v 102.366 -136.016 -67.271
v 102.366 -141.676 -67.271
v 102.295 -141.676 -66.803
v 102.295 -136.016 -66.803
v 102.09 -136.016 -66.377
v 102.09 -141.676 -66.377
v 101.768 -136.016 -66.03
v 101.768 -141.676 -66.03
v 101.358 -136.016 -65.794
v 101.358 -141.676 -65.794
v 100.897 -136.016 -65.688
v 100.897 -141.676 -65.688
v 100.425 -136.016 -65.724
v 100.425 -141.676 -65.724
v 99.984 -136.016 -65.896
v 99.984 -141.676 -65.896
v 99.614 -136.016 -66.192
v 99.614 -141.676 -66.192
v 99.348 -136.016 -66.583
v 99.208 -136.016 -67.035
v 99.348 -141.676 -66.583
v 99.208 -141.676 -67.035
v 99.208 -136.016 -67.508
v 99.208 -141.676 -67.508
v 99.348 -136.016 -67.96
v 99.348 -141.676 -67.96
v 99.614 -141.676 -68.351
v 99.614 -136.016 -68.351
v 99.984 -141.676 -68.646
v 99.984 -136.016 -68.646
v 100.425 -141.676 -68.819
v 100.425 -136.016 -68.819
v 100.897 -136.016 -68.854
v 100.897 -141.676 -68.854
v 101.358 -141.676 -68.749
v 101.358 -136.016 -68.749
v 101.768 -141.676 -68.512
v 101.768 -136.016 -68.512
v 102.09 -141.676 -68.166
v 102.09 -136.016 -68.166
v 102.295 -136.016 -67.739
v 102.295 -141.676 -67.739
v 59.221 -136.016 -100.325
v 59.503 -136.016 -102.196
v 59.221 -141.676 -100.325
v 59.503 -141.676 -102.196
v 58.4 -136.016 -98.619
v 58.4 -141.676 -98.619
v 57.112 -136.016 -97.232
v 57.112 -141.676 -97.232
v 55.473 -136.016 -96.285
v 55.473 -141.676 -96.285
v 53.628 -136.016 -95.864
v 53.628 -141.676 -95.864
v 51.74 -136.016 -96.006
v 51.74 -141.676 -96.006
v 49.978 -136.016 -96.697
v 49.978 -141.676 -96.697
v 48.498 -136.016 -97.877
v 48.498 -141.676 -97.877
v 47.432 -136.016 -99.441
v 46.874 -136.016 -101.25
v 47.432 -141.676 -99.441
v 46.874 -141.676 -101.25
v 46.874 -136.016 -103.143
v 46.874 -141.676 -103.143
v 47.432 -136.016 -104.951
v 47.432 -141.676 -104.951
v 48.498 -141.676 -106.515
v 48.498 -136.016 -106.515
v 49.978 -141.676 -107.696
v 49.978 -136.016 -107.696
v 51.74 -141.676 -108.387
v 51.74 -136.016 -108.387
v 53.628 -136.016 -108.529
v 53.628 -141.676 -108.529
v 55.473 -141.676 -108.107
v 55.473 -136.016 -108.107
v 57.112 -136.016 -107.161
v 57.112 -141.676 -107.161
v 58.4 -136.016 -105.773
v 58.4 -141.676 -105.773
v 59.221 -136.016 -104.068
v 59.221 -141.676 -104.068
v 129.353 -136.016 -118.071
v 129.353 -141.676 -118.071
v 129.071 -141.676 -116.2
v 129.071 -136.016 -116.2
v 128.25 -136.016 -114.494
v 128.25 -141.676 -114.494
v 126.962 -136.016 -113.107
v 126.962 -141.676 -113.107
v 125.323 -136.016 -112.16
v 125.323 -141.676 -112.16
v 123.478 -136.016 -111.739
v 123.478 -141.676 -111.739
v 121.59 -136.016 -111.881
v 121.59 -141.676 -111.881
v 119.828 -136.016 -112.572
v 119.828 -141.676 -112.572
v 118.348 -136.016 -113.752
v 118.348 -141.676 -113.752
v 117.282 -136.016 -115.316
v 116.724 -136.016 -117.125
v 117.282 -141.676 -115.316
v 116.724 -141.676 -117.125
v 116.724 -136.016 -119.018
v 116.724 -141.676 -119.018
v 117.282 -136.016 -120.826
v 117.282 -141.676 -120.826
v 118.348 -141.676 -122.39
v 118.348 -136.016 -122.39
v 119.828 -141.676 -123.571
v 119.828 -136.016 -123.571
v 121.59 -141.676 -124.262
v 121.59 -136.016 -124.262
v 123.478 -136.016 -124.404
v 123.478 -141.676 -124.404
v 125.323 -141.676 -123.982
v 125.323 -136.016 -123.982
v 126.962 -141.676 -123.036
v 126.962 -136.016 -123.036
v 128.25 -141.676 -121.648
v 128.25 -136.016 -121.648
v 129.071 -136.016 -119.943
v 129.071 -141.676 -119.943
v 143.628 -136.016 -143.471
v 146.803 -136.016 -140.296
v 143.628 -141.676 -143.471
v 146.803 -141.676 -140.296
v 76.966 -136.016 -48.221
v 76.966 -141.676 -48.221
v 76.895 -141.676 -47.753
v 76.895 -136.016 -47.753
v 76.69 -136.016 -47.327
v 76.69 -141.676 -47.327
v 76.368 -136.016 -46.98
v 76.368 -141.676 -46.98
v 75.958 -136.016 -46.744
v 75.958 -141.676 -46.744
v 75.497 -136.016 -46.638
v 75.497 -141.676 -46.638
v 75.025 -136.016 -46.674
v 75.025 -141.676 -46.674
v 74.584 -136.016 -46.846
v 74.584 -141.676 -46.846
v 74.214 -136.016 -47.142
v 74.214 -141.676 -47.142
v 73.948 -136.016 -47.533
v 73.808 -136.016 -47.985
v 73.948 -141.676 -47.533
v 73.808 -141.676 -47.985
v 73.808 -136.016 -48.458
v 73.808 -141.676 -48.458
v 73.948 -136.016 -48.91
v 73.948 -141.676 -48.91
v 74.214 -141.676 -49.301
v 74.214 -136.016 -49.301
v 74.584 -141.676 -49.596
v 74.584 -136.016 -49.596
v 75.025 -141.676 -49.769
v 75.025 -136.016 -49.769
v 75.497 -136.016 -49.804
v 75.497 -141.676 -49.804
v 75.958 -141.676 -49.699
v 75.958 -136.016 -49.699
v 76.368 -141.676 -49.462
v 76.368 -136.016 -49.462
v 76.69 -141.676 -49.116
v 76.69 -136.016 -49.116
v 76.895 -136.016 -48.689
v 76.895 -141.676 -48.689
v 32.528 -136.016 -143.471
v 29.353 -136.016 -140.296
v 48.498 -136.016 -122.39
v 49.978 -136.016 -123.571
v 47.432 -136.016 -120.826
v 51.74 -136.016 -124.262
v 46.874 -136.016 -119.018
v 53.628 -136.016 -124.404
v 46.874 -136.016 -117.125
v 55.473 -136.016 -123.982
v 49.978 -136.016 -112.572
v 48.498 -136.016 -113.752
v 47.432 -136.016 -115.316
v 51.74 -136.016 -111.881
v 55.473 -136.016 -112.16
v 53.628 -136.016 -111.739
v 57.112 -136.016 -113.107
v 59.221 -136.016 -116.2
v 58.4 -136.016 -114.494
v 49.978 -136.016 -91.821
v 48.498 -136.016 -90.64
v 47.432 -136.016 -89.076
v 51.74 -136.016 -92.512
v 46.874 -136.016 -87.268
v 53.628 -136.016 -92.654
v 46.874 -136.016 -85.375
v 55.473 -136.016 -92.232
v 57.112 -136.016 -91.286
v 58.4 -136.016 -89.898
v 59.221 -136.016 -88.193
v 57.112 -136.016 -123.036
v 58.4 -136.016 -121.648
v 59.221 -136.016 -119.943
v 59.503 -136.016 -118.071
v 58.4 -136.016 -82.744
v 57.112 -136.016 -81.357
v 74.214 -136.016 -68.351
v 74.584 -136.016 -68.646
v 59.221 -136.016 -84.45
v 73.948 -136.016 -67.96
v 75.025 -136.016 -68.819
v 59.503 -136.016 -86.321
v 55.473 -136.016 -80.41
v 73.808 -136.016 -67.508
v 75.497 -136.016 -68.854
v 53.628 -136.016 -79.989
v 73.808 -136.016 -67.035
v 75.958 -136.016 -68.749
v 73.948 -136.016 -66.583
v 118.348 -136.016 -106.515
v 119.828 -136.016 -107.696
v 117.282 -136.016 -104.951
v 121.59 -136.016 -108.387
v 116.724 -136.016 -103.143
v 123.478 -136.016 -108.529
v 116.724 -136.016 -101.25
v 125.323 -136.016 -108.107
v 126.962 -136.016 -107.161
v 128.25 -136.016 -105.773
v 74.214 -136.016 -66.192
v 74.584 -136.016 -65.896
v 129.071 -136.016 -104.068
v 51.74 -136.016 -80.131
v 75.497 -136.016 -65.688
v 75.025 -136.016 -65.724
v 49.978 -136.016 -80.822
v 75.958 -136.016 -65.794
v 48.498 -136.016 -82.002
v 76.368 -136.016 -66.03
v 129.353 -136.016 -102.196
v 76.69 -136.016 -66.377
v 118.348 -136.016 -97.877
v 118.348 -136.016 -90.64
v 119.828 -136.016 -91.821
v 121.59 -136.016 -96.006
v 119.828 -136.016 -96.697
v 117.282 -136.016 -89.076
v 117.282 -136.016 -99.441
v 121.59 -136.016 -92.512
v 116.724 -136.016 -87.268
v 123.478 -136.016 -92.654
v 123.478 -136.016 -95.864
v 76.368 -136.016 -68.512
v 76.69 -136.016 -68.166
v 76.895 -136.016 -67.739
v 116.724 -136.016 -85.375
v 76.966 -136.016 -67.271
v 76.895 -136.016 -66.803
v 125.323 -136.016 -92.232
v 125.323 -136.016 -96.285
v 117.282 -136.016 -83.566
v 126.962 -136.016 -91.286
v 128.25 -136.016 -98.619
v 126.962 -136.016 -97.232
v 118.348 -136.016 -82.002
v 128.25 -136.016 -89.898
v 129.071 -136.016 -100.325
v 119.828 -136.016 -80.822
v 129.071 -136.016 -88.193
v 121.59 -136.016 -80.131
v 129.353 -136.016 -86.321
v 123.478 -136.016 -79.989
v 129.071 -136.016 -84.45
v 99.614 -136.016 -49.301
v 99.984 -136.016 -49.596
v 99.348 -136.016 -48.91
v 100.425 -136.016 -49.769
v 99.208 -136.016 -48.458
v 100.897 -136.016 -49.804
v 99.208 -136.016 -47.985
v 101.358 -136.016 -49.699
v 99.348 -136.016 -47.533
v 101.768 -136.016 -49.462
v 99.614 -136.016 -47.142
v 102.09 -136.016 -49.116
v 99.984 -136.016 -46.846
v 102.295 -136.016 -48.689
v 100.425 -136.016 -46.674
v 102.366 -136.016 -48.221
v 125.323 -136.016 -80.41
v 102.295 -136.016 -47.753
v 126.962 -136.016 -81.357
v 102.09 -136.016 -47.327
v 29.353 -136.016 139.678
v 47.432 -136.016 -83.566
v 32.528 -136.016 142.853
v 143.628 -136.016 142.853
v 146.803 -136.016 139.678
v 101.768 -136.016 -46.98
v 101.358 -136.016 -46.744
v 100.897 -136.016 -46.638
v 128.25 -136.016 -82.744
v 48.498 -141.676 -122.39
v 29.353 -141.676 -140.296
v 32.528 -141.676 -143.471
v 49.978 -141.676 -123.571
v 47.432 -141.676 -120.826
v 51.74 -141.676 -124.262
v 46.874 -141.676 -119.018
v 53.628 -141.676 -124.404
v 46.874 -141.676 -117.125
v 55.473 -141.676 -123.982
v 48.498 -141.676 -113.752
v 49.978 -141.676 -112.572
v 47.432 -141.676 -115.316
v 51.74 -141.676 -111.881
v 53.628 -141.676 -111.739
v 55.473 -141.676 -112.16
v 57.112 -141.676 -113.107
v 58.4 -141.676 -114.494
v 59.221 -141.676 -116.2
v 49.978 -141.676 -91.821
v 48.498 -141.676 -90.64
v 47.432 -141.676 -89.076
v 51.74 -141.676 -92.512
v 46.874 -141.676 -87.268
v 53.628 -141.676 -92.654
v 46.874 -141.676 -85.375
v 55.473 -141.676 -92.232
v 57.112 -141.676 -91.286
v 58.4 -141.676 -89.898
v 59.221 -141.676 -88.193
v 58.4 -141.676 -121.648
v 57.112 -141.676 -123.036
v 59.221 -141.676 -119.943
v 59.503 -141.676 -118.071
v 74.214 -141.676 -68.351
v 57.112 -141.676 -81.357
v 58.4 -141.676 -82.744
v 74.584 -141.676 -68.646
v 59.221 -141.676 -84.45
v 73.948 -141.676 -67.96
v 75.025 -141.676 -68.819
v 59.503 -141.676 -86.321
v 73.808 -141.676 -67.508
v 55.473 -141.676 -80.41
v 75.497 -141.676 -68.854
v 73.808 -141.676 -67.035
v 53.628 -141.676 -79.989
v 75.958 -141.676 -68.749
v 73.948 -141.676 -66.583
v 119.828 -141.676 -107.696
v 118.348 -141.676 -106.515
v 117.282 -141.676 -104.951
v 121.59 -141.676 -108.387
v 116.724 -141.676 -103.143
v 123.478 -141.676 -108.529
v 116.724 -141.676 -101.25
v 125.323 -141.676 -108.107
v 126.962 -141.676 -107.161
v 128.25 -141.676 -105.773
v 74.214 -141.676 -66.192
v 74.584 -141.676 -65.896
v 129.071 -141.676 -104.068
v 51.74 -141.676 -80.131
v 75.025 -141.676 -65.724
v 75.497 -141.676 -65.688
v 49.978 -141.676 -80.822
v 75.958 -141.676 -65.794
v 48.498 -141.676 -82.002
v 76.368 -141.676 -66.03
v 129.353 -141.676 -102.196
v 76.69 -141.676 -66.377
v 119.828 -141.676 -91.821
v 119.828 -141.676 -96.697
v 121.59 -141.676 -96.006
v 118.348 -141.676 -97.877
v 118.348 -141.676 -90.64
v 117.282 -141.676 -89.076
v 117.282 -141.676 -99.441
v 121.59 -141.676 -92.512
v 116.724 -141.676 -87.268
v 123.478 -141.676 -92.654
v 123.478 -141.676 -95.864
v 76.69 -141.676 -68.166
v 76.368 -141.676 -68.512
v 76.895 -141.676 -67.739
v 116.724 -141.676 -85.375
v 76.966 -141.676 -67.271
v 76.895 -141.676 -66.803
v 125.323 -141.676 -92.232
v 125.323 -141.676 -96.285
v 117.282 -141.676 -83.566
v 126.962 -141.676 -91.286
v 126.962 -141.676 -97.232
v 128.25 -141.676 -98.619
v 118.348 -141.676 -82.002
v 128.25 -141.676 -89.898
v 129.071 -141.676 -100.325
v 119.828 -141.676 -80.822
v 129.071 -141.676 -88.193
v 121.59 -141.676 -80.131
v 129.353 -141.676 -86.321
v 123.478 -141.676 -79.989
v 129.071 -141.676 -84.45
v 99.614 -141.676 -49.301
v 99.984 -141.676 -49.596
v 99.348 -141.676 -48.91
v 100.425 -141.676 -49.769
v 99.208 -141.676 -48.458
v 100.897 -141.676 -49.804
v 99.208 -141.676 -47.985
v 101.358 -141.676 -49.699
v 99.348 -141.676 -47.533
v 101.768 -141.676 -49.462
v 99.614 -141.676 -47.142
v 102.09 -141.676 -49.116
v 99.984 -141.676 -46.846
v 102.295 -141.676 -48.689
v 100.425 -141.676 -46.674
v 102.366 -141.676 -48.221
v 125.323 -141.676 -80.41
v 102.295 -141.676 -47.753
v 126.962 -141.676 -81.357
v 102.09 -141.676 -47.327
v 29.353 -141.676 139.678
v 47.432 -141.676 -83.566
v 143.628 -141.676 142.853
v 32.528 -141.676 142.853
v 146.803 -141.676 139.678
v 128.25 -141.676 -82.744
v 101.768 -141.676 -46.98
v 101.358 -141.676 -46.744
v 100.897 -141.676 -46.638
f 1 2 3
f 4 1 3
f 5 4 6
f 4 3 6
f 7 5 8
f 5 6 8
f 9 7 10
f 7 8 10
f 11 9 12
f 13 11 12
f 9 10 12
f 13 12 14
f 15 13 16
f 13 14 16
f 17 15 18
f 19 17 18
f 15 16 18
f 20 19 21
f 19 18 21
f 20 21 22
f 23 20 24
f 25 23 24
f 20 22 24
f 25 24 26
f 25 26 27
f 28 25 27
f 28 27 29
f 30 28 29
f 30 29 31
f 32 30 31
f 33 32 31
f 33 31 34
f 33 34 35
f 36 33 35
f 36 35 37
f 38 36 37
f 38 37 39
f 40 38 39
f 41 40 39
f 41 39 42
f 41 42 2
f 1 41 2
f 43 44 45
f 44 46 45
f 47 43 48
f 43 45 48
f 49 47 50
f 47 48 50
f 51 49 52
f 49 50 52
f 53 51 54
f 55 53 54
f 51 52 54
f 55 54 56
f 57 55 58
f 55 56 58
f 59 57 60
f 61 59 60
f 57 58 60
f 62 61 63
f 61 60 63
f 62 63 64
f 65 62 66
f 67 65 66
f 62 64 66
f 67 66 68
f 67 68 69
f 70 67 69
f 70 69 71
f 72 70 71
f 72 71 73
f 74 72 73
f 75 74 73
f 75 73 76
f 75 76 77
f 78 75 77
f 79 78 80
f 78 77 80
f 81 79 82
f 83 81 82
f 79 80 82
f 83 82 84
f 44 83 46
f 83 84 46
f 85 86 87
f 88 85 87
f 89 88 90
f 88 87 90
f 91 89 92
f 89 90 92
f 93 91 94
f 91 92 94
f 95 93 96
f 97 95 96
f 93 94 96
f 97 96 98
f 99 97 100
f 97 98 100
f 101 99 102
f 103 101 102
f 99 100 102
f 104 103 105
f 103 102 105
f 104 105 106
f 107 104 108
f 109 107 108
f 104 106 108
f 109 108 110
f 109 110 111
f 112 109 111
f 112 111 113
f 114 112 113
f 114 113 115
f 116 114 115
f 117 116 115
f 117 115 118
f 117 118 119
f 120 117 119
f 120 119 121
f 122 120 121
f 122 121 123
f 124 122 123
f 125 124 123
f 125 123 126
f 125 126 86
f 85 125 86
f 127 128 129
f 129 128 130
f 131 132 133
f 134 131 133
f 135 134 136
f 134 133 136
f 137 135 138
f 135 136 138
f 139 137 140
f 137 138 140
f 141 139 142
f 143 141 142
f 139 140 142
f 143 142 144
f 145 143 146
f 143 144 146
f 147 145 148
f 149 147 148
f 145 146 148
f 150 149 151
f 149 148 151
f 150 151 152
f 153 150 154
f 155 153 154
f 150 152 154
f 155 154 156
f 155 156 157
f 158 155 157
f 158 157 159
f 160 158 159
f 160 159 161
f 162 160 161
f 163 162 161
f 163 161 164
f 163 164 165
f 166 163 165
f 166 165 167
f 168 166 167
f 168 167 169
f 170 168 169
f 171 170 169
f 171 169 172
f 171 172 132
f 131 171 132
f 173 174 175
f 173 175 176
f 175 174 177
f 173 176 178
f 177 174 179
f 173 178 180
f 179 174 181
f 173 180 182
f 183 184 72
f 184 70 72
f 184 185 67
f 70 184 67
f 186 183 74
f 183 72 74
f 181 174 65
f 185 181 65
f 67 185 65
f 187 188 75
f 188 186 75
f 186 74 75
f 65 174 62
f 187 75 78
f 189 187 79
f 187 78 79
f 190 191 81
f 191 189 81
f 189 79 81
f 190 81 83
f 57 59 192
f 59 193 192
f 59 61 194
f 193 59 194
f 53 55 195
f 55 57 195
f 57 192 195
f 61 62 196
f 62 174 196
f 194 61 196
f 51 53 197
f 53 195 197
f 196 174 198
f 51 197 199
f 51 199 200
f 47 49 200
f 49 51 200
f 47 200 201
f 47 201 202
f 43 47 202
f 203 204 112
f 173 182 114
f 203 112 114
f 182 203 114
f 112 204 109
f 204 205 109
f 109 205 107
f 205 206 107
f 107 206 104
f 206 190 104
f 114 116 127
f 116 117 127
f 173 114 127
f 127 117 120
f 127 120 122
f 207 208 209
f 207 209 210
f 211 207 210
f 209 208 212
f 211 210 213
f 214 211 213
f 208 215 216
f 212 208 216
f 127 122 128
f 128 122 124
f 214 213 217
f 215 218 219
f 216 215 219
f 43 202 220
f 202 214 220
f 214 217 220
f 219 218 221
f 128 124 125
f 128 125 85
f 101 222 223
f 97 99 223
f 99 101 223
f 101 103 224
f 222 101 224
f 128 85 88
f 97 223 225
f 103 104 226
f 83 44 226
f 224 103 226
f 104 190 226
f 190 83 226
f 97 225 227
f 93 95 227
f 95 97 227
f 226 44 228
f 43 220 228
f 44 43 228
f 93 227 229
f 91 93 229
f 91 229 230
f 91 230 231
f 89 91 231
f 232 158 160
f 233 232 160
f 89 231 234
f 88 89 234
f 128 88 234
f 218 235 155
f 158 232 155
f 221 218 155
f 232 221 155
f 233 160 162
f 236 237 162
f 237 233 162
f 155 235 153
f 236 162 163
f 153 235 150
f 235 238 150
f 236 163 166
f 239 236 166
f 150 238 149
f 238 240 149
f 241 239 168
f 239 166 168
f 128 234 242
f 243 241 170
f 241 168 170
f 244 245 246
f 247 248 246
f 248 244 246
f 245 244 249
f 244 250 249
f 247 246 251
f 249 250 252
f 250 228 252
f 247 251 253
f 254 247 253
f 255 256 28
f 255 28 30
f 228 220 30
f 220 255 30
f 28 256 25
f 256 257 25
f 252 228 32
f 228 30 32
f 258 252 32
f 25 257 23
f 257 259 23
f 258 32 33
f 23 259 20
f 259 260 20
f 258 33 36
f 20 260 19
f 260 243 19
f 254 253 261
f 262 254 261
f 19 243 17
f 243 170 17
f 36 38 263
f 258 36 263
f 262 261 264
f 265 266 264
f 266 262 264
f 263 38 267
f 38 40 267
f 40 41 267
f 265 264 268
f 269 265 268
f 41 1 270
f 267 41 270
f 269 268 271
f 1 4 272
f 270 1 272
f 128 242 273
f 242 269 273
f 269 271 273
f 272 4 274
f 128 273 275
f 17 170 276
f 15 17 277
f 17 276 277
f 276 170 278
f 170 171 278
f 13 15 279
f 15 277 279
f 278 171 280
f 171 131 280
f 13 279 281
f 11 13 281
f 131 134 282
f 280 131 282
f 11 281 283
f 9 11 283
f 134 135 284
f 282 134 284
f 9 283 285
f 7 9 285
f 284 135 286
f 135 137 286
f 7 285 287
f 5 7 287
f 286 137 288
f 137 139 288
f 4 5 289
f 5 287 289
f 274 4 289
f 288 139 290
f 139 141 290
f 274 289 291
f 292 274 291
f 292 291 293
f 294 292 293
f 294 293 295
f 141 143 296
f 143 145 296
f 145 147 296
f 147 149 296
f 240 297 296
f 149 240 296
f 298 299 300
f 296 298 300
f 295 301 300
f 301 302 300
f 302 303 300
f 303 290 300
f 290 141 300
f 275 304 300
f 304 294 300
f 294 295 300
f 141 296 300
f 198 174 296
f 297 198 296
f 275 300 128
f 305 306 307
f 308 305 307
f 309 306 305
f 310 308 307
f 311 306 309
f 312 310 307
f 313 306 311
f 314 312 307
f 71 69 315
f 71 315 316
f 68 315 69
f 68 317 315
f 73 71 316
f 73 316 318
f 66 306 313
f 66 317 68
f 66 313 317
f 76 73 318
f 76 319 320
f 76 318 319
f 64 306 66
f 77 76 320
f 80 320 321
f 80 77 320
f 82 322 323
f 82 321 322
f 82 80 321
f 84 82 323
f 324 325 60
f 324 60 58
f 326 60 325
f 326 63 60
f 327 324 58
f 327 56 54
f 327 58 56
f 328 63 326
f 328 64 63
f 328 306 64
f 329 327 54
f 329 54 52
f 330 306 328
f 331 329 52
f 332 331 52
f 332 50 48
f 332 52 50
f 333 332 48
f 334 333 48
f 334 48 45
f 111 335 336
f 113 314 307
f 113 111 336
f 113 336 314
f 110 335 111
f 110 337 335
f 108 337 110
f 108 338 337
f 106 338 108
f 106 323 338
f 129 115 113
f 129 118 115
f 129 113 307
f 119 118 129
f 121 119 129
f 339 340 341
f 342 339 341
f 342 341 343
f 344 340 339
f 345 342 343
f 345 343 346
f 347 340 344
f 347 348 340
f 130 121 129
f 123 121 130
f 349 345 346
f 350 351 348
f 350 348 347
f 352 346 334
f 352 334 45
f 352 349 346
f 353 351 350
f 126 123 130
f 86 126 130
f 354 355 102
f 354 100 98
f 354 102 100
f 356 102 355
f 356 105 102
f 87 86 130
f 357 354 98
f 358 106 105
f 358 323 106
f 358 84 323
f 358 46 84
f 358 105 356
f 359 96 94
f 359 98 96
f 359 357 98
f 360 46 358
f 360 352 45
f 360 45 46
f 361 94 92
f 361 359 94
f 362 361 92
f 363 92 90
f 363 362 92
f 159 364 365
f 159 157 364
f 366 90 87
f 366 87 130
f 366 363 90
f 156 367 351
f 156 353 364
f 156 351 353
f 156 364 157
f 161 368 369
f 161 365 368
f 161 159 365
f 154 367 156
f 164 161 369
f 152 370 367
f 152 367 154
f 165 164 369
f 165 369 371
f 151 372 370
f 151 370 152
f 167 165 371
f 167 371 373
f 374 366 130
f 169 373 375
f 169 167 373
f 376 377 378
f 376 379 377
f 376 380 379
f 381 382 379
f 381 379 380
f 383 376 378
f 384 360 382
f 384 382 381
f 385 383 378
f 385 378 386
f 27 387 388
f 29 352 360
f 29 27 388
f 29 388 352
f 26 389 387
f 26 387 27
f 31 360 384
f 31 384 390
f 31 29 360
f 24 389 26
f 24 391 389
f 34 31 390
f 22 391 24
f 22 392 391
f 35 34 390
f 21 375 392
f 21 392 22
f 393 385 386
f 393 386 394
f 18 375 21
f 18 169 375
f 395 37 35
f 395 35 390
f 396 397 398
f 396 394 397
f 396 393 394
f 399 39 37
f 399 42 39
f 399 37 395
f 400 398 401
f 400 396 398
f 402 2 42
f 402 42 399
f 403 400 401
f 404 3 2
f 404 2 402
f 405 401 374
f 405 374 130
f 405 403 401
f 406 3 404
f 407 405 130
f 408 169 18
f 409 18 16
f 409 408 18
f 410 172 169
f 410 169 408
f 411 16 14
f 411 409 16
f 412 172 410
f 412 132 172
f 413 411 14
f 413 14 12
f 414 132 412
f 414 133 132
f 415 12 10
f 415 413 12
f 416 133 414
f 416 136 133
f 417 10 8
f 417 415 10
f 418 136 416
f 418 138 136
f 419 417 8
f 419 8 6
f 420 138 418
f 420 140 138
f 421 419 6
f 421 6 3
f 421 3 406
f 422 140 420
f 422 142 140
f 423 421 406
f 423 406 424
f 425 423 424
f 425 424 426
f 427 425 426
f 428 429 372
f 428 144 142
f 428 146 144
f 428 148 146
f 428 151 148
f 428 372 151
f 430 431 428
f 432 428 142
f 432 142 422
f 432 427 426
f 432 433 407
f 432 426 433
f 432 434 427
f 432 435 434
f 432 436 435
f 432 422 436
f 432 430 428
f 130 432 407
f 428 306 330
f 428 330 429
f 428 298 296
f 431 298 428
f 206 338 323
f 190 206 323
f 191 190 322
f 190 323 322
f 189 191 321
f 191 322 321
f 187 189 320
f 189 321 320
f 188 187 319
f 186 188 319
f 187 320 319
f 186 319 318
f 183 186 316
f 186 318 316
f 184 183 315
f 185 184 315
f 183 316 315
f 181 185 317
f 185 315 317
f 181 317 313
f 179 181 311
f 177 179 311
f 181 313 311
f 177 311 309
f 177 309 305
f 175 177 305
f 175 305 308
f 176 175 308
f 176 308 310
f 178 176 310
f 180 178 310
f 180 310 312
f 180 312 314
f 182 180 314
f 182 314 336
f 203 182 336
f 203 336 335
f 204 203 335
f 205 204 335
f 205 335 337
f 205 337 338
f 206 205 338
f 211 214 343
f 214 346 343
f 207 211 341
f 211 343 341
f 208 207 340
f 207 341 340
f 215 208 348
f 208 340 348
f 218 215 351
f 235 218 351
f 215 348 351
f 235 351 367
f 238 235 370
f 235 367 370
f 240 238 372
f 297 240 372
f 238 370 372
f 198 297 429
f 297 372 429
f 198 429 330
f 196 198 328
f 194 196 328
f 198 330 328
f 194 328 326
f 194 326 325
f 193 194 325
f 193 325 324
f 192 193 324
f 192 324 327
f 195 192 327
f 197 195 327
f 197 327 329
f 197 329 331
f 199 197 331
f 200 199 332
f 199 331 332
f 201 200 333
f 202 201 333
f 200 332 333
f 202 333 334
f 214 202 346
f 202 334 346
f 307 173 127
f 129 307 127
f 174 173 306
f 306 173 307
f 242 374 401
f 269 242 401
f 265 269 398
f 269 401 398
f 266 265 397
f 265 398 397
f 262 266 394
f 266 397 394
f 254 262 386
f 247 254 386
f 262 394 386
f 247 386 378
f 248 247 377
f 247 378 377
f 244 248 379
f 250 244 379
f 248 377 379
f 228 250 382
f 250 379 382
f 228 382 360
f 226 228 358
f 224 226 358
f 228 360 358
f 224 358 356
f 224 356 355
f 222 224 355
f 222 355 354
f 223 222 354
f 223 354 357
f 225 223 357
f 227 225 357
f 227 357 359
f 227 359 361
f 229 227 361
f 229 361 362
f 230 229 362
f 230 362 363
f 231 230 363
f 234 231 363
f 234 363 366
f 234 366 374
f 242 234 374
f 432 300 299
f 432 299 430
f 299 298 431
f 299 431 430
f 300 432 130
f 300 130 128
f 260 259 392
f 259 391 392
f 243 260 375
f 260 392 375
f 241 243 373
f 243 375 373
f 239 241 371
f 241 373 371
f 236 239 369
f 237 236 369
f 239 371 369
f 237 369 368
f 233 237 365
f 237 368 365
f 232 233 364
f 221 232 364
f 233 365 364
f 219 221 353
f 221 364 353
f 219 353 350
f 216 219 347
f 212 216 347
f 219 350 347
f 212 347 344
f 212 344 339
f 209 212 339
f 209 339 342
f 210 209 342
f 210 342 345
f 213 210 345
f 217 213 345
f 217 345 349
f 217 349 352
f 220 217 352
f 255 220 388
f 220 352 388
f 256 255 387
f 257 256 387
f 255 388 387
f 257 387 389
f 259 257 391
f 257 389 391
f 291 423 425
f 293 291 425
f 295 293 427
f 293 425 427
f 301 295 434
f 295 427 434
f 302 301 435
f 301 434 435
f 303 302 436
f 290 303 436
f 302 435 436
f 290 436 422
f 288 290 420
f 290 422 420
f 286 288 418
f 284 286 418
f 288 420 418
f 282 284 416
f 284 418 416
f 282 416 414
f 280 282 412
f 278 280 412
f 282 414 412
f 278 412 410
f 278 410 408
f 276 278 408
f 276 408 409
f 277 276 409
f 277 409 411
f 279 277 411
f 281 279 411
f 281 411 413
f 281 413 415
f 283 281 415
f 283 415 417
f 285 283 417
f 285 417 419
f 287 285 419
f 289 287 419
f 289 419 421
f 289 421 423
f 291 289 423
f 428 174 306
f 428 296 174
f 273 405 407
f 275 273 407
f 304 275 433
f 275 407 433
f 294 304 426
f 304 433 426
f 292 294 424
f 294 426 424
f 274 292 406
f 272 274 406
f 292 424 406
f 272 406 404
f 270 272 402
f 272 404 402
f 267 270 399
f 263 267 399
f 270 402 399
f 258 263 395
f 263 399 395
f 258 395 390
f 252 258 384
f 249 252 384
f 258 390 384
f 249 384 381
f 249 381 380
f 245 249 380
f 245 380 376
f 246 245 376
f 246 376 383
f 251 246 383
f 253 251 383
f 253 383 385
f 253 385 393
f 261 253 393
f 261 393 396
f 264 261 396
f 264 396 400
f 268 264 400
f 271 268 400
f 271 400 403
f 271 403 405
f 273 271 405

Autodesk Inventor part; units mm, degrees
ref_plane "YZ Plane" through (0, 0, 0) normal (1, 0, 0) x (0, 1, 0)
ref_plane "XZ Plane" through (0, 0, 0) normal (0, 1, 0) x (-1, 0, 0)
ref_plane "XY Plane" through (0, 0, 0) normal (0, 0, 1) x (1, 0, 0)
ref_plane "Work Plane1" through (33.3916, -139.4155, 142.8527) normal (0, 0, 1) x (1, 0, 0)
sketch "Sketch1" plane through (33.3916, -139.4155, 142.8527) normal (0, 0, 1) x (1, 0, 0)
  line L0 (-4.0384, 3.4) -> (113.4116, 3.4)
  line L1 (54.6866, 21.1837) -> (54.6866, -18.7057) construction
  line L2 (-4.0384, 3.4) -> (-4.0384, -2.26)
  line L3 (-4.0384, -2.26) -> (113.4116, -2.26)
  line L4 (113.4116, -2.26) -> (113.4116, 3.4)
  dimension "d0" = 5.66
extrude "Extrusion1" add sketch "Sketch1" against normal blind 286.324
sketch "Sketch2" plane through (29.3531, -141.6755, 142.8527) normal (0, -1, 0) x (1, 0, 0)
  line L0 (117.45, 0) -> (0, 0) projected
  line L1 (117.45, -286.324) -> (0, -286.324) projected
  line L2 (58.725, 0) -> (58.725, -286.324) construction
  line L3 (46.025, -191.074) -> (71.425, -191.074) construction
  line L4 (71.425, -191.074) -> (71.425, -210.124) construction
  line L5 (71.425, -210.124) -> (46.025, -210.124) construction
  line L6 (46.025, -210.124) -> (46.025, -191.074) construction
  circle A0 centre (46.025, -191.074) radius 1.5875
  circle A1 centre (71.425, -191.074) radius 1.5875
  circle A2 centre (71.425, -210.124) radius 1.5875
  circle A3 centre (46.025, -210.124) radius 1.5875
  circle A4 centre (23.8, -260.924) radius 6.35
  circle A5 centre (23.8, -245.049) radius 6.35
  circle A6 centre (23.8, -229.174) radius 6.35
  circle A7 centre (93.65, -260.924) radius 6.35
  circle A8 centre (93.65, -245.049) radius 6.35
  circle A9 centre (93.65, -229.174) radius 6.35
  point P0 (-29.3531, -142.8527)
  dimension "d4" = 25.4
  dimension "d5" = 19.05
  dimension "d6" = 76.2
  dimension "d7" = 12.7
  dimension "d8" = 3.175
  dimension "d9" = 3.175
  dimension "d10" = 3.175
  dimension "d11" = 3.175
  dimension "d12" = 12.7
  dimension "d13" = 12.7
  dimension "d14" = 15.875
  dimension "d15" = 25.4
  dimension "d16" = 12.7
  dimension "d17" = 15.875
  dimension "d18" = 12.7
  dimension "d19" = 12.7
  dimension "d20" = 12.7
  dimension "d21" = 15.875
  dimension "d22" = 15.875
  dimension "d23" = 25.4
  dimension "d24" = 34.925
  dimension "d25" = 34.925
extrude "Extrusion2" cut sketch "Sketch2" against normal blind 5.66
chamfer "Chamfer1" distance 3.175 angle 45 4 edges at (146.8031, -138.8455, 142.8527) (29.3531, -138.8455, 142.8527) (29.3531, -138.8455, -143.4713) (146.8031, -138.8455, -143.4713)
properties part number "Z-table"
